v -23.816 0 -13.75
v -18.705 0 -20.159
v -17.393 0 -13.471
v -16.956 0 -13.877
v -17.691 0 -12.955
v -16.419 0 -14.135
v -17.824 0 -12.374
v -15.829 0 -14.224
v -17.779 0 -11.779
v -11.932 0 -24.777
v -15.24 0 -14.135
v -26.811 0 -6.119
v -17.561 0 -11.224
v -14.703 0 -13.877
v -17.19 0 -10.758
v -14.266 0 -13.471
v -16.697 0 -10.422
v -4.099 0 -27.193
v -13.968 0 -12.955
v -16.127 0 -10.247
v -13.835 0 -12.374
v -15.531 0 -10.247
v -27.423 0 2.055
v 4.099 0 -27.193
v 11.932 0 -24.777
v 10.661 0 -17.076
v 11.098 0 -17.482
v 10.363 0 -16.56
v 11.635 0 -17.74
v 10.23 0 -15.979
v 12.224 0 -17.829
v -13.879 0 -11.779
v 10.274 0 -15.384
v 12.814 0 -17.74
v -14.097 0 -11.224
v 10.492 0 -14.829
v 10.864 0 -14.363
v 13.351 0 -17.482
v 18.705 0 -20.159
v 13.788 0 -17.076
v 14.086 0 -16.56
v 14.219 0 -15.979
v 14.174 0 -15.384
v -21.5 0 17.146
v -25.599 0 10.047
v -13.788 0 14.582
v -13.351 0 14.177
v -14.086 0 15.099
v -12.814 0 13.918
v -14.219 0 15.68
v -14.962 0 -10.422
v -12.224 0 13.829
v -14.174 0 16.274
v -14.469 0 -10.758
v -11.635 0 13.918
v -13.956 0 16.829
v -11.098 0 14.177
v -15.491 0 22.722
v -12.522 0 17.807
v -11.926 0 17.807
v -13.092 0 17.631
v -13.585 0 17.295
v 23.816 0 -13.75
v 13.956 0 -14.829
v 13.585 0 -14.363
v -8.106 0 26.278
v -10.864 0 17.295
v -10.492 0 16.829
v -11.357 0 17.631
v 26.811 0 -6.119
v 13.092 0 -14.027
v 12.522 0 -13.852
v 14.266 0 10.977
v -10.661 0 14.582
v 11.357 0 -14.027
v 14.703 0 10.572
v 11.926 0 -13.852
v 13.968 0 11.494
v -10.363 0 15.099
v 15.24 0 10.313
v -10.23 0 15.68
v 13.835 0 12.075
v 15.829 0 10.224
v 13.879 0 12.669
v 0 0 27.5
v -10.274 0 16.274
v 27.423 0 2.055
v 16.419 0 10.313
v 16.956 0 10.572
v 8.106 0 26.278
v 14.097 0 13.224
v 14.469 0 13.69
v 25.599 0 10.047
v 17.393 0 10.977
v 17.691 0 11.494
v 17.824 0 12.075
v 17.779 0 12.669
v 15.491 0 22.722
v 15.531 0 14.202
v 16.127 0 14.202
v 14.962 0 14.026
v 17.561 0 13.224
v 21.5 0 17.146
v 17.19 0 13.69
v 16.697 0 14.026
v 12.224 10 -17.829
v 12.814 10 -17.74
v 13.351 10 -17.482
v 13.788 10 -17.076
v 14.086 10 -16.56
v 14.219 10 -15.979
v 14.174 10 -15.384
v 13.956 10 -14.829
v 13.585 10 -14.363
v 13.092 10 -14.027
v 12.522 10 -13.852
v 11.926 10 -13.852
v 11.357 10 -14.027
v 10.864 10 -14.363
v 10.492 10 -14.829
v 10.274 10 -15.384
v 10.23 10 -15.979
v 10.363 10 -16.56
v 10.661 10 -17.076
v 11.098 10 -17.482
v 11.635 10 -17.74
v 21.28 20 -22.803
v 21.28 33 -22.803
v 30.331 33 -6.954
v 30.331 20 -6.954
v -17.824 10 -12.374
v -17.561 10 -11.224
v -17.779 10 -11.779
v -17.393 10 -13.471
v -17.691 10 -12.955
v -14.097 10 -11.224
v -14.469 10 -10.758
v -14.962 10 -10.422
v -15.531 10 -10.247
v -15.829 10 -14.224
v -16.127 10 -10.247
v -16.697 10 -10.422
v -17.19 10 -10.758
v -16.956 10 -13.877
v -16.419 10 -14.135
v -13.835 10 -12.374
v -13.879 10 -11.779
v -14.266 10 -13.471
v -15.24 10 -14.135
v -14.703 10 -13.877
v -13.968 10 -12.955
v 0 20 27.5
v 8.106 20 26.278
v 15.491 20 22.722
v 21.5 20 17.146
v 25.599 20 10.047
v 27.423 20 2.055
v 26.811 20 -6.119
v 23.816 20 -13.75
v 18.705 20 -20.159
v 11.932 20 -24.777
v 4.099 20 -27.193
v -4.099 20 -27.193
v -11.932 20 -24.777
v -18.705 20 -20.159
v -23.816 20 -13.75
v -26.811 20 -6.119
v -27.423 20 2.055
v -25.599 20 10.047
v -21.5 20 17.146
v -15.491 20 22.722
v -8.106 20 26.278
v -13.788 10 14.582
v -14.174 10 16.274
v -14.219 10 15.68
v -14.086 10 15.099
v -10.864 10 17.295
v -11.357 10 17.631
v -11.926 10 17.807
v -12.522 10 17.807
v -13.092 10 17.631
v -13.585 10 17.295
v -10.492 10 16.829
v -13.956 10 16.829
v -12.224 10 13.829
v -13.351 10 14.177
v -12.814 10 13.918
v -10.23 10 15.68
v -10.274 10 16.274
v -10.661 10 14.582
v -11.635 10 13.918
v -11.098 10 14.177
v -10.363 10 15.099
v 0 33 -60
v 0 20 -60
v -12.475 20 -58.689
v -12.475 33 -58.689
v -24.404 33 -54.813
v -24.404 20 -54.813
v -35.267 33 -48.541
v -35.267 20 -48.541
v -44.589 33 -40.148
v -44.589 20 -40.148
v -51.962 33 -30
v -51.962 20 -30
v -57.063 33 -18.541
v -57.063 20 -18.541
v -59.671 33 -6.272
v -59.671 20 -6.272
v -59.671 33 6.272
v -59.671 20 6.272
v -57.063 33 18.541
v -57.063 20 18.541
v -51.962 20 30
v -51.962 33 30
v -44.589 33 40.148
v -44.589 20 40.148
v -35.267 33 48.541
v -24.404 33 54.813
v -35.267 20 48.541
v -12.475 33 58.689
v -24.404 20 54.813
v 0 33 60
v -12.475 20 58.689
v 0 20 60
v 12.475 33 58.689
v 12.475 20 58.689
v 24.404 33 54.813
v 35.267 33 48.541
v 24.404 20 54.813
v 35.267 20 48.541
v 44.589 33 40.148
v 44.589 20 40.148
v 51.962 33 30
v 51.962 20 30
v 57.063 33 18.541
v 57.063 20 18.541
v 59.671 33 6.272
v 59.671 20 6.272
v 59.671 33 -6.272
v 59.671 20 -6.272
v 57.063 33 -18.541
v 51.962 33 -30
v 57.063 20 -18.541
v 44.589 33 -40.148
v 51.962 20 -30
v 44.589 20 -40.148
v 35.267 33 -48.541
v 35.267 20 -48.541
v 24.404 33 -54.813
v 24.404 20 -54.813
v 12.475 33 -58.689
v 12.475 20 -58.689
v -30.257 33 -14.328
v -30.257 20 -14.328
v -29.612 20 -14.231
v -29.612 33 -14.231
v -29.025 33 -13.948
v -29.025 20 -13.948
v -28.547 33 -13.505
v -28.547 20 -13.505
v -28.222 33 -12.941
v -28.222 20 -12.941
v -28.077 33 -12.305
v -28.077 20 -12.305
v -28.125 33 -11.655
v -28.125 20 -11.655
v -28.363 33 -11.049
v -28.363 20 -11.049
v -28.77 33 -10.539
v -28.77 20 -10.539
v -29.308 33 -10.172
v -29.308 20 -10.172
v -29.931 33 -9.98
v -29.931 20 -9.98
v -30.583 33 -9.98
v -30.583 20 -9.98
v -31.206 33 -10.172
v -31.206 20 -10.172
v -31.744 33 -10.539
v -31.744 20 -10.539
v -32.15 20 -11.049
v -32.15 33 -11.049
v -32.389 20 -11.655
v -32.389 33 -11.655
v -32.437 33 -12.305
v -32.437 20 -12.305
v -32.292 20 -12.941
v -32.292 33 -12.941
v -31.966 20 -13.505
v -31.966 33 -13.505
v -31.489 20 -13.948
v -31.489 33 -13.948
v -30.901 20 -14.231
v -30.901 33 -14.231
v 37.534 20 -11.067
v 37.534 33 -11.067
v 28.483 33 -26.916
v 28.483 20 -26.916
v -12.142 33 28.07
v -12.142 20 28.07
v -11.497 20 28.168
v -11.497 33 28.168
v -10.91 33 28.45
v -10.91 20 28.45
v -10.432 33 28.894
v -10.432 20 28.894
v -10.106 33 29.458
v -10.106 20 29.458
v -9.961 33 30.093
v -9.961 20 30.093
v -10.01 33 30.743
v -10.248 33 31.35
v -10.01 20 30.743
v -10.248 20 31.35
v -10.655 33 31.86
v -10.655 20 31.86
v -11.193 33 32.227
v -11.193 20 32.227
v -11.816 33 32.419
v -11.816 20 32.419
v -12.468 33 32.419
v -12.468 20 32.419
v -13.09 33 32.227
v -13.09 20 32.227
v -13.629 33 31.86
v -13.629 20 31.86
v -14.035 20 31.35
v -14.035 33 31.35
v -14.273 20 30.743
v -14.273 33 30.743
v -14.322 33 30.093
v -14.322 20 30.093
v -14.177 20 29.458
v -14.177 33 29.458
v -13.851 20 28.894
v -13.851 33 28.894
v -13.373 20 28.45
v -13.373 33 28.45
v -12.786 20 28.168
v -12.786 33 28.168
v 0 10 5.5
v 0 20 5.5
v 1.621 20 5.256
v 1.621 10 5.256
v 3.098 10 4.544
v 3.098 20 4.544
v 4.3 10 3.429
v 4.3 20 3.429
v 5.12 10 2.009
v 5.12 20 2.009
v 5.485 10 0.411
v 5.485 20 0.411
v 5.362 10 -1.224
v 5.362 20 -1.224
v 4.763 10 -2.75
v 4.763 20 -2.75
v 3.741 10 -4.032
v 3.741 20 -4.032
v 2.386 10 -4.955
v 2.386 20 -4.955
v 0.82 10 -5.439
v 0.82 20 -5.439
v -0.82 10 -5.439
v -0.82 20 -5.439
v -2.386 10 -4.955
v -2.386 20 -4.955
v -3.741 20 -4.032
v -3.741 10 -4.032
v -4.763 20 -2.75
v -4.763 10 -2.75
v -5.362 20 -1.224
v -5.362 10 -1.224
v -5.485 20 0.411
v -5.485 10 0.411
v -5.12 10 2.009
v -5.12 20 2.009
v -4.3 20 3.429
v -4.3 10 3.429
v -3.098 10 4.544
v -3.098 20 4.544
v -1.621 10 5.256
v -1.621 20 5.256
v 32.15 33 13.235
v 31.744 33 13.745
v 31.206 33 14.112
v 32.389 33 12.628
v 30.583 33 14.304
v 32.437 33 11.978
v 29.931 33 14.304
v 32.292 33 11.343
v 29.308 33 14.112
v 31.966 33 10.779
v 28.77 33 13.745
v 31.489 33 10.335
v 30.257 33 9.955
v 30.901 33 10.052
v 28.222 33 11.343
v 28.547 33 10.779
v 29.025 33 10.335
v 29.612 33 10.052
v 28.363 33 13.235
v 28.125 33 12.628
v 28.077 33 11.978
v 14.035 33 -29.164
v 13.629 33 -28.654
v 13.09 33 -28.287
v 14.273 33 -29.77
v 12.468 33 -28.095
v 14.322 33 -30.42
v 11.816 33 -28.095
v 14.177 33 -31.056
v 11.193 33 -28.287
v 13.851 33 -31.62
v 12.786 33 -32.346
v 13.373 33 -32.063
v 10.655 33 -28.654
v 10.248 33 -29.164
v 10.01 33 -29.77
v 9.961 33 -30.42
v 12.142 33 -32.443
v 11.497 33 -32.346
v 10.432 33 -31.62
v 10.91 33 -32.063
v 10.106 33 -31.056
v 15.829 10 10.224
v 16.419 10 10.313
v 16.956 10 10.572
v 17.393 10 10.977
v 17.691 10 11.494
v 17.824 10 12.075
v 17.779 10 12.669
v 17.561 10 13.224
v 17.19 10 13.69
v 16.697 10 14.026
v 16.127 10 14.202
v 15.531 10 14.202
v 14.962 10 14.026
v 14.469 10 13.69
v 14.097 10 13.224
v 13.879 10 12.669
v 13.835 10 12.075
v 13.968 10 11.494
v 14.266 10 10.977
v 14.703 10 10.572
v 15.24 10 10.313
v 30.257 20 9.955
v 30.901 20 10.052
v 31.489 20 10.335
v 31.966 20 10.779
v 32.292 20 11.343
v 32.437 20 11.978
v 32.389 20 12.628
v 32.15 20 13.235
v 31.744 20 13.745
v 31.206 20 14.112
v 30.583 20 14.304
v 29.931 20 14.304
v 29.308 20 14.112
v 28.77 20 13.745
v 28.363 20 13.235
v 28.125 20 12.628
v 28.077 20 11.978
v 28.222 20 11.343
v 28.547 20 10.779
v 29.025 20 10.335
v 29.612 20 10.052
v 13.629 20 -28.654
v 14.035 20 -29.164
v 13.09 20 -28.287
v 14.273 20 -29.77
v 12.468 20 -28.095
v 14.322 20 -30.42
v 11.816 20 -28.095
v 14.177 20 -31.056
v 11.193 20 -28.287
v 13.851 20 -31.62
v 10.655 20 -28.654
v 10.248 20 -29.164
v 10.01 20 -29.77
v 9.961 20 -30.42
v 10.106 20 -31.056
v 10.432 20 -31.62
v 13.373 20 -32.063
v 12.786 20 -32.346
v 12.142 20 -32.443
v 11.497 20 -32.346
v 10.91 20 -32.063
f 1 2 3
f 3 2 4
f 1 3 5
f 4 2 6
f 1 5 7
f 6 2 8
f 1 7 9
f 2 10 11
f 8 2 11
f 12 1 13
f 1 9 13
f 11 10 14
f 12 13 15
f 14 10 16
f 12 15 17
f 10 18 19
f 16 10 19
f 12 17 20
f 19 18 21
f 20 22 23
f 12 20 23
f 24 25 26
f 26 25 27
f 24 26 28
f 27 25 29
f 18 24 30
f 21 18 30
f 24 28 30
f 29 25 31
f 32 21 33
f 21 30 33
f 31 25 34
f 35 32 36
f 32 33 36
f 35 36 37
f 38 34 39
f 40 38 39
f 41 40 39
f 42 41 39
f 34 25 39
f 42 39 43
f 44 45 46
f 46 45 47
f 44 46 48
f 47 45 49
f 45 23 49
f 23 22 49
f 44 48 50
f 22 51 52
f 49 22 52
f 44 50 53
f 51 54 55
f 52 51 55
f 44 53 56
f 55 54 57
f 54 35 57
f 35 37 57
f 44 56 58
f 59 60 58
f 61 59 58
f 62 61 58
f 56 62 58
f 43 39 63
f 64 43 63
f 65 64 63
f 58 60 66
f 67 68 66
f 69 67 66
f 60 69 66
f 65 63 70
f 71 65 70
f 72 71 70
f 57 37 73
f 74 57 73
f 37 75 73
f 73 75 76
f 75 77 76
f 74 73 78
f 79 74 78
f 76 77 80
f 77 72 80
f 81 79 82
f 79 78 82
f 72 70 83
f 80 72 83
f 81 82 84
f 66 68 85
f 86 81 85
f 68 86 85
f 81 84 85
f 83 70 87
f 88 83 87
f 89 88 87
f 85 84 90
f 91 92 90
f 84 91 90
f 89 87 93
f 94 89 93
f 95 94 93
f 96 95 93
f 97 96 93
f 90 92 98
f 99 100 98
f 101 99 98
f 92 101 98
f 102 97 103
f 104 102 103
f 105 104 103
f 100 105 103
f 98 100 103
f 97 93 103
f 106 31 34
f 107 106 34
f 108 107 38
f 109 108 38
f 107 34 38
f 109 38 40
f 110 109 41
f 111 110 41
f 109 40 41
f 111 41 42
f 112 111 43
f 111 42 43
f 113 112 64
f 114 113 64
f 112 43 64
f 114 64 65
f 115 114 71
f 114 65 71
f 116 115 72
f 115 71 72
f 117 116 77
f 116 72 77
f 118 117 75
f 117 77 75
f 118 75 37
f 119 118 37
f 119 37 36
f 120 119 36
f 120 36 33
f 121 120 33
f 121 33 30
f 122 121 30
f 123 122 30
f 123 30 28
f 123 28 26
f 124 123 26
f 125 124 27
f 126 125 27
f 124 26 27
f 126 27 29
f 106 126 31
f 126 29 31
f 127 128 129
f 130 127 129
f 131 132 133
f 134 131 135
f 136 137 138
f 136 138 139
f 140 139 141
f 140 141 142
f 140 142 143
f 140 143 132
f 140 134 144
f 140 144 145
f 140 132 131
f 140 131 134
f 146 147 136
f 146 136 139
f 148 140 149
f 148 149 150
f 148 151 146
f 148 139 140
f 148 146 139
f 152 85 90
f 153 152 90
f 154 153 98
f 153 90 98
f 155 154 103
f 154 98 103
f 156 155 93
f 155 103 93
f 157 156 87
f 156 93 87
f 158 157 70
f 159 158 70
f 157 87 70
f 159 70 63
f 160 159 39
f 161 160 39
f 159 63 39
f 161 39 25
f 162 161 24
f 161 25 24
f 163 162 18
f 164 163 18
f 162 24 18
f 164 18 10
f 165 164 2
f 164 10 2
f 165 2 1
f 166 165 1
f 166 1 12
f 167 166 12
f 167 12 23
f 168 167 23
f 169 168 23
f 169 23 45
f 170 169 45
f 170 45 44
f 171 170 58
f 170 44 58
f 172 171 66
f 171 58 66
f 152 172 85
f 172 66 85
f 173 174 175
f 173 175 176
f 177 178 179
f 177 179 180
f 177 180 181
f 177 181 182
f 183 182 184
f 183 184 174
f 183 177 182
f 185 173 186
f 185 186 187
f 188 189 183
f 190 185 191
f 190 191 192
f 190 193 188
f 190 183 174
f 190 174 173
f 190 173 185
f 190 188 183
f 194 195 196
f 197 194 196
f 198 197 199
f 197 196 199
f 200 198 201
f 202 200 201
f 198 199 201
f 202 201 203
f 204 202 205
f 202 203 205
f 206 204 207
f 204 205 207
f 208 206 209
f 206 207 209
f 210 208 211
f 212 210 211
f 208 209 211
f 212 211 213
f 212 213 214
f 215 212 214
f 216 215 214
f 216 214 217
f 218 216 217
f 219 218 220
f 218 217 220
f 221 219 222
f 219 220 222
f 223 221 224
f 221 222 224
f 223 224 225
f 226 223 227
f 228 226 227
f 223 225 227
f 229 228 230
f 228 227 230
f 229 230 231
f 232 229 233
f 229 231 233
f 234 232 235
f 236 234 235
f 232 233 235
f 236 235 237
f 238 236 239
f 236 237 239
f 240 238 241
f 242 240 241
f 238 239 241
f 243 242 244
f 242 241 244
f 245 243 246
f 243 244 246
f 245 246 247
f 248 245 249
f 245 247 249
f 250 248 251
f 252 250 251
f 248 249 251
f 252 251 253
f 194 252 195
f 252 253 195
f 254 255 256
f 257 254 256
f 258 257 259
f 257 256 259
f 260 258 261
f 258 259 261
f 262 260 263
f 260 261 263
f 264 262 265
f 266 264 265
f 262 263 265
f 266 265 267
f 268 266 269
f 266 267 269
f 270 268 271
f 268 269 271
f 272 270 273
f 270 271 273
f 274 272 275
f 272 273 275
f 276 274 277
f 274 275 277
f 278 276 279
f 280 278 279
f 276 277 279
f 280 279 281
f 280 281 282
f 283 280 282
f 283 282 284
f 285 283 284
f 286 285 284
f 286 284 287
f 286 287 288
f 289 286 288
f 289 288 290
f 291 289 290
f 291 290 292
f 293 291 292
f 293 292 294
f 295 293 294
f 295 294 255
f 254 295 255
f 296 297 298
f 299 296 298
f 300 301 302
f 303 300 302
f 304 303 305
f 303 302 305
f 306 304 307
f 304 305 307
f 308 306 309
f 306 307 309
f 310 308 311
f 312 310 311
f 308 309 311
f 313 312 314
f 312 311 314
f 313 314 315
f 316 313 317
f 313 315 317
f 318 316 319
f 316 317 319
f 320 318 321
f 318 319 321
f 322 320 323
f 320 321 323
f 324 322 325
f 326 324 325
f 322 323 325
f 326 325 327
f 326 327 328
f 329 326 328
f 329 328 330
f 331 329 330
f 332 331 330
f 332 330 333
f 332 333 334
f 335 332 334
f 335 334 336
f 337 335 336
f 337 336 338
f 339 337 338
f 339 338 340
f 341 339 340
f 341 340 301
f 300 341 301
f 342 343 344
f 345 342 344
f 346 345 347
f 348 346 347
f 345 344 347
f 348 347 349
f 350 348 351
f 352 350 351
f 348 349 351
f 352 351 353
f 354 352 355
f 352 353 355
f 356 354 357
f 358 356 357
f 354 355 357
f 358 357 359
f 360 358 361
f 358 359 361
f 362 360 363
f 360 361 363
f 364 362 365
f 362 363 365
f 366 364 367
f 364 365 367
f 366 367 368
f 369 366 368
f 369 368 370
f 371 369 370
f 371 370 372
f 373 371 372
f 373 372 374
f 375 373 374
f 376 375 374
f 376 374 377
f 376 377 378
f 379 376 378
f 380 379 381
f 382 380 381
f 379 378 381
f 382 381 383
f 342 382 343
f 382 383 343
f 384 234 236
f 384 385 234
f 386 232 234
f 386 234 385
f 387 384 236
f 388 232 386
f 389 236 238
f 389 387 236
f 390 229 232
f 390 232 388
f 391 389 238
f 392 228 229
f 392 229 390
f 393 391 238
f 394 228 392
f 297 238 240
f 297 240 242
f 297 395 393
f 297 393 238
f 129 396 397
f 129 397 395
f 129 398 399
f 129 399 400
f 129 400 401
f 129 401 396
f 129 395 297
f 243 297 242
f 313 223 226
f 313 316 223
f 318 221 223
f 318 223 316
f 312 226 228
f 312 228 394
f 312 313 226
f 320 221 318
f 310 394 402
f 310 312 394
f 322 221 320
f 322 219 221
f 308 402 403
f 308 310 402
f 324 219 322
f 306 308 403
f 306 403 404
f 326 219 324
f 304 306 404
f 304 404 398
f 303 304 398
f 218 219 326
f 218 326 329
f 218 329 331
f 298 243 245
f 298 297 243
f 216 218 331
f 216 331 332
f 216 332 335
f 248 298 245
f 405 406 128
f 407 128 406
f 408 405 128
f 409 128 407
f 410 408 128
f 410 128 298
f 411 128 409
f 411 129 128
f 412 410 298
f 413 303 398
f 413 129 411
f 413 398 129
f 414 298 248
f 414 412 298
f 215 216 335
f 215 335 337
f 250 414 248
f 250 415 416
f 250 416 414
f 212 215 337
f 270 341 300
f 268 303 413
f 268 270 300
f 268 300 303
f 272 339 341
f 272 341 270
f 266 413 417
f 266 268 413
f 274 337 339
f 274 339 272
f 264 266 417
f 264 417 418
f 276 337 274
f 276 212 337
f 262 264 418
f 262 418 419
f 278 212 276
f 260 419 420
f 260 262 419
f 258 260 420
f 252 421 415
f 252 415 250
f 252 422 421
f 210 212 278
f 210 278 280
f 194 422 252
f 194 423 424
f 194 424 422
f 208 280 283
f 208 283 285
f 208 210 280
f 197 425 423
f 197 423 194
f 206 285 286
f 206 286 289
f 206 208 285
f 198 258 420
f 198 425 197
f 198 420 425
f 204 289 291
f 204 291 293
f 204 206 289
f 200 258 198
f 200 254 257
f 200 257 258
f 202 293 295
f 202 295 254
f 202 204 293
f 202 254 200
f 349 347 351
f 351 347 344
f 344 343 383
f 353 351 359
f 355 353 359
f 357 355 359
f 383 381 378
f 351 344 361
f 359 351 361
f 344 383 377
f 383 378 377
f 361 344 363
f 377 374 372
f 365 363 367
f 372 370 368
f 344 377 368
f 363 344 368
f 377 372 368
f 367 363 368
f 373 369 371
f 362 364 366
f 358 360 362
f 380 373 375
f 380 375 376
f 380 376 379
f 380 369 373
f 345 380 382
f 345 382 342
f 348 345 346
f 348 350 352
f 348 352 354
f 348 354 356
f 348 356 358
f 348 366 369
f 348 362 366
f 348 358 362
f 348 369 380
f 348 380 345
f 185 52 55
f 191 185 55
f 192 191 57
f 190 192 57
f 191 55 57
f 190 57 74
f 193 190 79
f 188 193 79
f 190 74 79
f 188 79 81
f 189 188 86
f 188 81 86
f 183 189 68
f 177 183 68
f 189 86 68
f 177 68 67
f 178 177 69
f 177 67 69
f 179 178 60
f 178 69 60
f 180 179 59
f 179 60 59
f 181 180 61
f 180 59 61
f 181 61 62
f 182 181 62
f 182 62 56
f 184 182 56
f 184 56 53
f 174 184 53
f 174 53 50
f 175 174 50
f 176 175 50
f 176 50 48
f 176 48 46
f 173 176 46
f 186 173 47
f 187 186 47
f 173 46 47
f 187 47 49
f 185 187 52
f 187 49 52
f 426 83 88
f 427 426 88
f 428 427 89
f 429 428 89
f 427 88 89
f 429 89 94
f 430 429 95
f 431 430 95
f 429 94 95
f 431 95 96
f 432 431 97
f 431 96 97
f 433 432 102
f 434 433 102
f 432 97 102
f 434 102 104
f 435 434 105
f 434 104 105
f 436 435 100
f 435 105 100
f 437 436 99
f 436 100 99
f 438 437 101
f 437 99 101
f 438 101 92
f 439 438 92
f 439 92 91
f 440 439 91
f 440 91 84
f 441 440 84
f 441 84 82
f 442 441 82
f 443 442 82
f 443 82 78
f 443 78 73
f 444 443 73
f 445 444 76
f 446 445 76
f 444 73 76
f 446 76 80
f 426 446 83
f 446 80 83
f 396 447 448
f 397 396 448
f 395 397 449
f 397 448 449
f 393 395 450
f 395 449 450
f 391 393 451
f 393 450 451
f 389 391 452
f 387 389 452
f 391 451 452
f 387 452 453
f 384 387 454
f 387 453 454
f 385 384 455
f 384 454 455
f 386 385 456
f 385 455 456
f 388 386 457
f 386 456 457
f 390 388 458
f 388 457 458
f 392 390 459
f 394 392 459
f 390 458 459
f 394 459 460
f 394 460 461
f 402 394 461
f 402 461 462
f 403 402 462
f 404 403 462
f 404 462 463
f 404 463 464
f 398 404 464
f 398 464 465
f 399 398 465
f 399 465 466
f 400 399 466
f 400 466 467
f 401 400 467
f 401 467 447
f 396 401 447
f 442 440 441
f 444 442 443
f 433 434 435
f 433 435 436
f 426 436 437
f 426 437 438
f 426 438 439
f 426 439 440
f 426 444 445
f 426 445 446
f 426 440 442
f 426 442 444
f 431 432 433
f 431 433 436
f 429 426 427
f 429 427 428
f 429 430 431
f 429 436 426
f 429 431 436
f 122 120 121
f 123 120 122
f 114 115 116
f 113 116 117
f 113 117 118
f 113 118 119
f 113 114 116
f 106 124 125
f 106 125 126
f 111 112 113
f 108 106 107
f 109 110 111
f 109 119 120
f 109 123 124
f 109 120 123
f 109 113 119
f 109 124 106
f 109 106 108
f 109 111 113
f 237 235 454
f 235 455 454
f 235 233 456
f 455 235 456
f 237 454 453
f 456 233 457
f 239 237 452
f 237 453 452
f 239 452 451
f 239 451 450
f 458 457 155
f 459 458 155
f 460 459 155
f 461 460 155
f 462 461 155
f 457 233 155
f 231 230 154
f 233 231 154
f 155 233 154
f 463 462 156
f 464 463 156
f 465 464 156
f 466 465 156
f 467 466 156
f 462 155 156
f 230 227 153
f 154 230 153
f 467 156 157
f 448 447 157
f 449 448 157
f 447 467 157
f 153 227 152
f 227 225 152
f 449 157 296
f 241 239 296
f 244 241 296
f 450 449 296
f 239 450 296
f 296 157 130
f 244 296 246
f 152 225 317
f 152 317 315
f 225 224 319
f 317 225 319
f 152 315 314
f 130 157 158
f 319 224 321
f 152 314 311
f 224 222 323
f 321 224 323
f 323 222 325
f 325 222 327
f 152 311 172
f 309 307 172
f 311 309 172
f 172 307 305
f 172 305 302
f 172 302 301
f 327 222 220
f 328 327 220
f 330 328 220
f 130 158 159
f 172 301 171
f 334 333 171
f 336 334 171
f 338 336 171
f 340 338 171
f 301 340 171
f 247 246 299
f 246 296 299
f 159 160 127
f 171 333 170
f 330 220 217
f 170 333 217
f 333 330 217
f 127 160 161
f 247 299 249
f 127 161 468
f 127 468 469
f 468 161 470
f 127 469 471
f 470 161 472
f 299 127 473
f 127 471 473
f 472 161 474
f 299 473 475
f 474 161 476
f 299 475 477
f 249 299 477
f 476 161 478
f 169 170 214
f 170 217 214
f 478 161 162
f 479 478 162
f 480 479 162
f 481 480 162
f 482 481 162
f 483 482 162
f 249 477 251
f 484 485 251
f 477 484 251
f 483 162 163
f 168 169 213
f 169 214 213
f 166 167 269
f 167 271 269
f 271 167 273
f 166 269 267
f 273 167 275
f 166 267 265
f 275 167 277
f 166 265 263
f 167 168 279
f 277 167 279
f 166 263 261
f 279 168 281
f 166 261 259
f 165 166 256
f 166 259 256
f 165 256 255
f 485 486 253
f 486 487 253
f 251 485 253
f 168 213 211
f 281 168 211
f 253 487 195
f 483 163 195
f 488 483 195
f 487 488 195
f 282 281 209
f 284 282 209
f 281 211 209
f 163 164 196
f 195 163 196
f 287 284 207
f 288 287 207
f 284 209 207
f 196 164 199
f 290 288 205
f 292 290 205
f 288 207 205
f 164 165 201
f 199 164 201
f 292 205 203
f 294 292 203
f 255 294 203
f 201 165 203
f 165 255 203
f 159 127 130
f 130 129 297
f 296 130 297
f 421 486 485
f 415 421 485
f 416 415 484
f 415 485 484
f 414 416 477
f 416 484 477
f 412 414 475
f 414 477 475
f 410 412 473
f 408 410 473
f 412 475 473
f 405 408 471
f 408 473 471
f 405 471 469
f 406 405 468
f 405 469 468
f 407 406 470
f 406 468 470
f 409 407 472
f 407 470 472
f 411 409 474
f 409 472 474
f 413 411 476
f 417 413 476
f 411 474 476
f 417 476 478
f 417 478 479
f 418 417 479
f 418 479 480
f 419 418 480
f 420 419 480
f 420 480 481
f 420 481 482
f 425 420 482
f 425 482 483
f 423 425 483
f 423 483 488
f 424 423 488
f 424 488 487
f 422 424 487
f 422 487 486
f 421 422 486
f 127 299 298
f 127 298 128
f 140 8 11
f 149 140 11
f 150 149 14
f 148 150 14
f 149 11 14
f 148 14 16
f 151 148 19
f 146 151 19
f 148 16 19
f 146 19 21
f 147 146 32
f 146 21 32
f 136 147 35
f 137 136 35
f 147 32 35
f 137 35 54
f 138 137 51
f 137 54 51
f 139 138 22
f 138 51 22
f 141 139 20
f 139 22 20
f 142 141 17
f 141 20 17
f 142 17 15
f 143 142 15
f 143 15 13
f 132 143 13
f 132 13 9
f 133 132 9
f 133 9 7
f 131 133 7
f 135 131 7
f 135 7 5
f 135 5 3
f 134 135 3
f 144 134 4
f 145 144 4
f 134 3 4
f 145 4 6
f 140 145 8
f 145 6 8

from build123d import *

# Parameters (mm, degrees)
CROQUIS1_R              = 27.5
SALIENTE_EXTRUIR1_DEPTH = 20
CROQUIS3_R              = 5.5
CORTAR_EXTRUIR1_DEPTH   = 10
CROQUIS4_R              = 2
CORTAR_EXTRUIR2_DEPTH   = 10
CROQUIS5_R              = 60
SALIENTE_EXTRUIR2_DEPTH = 13
CORTAR_EXTRUIR3_DEPTH   = 92.043945433
CROQUIS7_R              = 2.186456698
CORTAR_EXTRUIR4_DEPTH   = 88.177978871


with BuildPart() as part:
    # Croquis1 → Saliente-Extruir1 (new body)
    with BuildSketch(Plane(origin=(0, 0, 0), x_dir=(1, 0, 0), z_dir=(0, 1, 0))):
        with Locations(Location((0, 0, 0), (0, 0, 270))):
            Circle(CROQUIS1_R)
    extrude(amount=SALIENTE_EXTRUIR1_DEPTH)

    # Croquis3 → Cortar-Extruir1 (cut)
    with BuildSketch(Plane(origin=(0, 20, 0), x_dir=(1, 0, 0), z_dir=(0, 1, 0))):
        with Locations(Location((0, 0, 0), (0, 0, 270))):
            Circle(CROQUIS3_R)
    extrude(amount=-CORTAR_EXTRUIR1_DEPTH, mode=Mode.SUBTRACT)

    # Croquis4 → Cortar-Extruir2 (cut)
    with BuildSketch(Plane.XZ):
        with Locations(Location((12.224300889, -15.829291449, 0), (0, 0, 270))):
            Circle(CROQUIS4_R)
        with Locations(Location((-15.829291449, -12.224300889, 0), (0, 0, 270))):
            Circle(CROQUIS4_R)
        with Locations(Location((-12.224300889, 15.829291449, 0), (0, 0, 270))):
            Circle(CROQUIS4_R)
        with Locations(Location((15.829291449, 12.224300889, 0), (0, 0, 270))):
            Circle(CROQUIS4_R)
    extrude(amount=-CORTAR_EXTRUIR2_DEPTH, mode=Mode.SUBTRACT)

    # Croquis5 → Saliente-Extruir2 (add)
    with BuildSketch(Plane(origin=(0, 20, 0), x_dir=(1, 0, 0), z_dir=(0, 1, 0))):
        with Locations(Location((0, 0, 0), (0, 0, 90))):
            Circle(CROQUIS5_R)
    extrude(amount=SALIENTE_EXTRUIR2_DEPTH)

    # Croquis6 → Cortar-Extruir3 (cut, through all)
    with BuildSketch(Plane(origin=(0, 33, 0), x_dir=(1, 0, 0), z_dir=(0, 1, 0))):
        Polygon((28.483293317, 26.915833338), (21.280272026, 22.80257149), (30.330623274, 6.953866704), (37.533644565, 11.067128551), align=None)
    extrude(amount=-CORTAR_EXTRUIR3_DEPTH, mode=Mode.SUBTRACT)

    # Croquis7 → Cortar-Extruir4 (cut, through all)
    with BuildSketch(Plane.XZ.offset(-20)):
        with Locations(Location((-30.256887418, -12.141762544, 0), (0, 0, 270))):
            Circle(CROQUIS7_R)
        with Locations(Location((-12.141762544, 30.256887418, 0), (0, 0, 270))):
            Circle(CROQUIS7_R)
        with Locations(Location((30.256887418, 12.141762544, 0), (0, 0, 270))):
            Circle(CROQUIS7_R)
        with Locations(Location((12.141762544, -30.256887418, 0), (0, 0, 270))):
            Circle(CROQUIS7_R)
    extrude(amount=-CORTAR_EXTRUIR4_DEPTH, mode=Mode.SUBTRACT)


solid = part.part
